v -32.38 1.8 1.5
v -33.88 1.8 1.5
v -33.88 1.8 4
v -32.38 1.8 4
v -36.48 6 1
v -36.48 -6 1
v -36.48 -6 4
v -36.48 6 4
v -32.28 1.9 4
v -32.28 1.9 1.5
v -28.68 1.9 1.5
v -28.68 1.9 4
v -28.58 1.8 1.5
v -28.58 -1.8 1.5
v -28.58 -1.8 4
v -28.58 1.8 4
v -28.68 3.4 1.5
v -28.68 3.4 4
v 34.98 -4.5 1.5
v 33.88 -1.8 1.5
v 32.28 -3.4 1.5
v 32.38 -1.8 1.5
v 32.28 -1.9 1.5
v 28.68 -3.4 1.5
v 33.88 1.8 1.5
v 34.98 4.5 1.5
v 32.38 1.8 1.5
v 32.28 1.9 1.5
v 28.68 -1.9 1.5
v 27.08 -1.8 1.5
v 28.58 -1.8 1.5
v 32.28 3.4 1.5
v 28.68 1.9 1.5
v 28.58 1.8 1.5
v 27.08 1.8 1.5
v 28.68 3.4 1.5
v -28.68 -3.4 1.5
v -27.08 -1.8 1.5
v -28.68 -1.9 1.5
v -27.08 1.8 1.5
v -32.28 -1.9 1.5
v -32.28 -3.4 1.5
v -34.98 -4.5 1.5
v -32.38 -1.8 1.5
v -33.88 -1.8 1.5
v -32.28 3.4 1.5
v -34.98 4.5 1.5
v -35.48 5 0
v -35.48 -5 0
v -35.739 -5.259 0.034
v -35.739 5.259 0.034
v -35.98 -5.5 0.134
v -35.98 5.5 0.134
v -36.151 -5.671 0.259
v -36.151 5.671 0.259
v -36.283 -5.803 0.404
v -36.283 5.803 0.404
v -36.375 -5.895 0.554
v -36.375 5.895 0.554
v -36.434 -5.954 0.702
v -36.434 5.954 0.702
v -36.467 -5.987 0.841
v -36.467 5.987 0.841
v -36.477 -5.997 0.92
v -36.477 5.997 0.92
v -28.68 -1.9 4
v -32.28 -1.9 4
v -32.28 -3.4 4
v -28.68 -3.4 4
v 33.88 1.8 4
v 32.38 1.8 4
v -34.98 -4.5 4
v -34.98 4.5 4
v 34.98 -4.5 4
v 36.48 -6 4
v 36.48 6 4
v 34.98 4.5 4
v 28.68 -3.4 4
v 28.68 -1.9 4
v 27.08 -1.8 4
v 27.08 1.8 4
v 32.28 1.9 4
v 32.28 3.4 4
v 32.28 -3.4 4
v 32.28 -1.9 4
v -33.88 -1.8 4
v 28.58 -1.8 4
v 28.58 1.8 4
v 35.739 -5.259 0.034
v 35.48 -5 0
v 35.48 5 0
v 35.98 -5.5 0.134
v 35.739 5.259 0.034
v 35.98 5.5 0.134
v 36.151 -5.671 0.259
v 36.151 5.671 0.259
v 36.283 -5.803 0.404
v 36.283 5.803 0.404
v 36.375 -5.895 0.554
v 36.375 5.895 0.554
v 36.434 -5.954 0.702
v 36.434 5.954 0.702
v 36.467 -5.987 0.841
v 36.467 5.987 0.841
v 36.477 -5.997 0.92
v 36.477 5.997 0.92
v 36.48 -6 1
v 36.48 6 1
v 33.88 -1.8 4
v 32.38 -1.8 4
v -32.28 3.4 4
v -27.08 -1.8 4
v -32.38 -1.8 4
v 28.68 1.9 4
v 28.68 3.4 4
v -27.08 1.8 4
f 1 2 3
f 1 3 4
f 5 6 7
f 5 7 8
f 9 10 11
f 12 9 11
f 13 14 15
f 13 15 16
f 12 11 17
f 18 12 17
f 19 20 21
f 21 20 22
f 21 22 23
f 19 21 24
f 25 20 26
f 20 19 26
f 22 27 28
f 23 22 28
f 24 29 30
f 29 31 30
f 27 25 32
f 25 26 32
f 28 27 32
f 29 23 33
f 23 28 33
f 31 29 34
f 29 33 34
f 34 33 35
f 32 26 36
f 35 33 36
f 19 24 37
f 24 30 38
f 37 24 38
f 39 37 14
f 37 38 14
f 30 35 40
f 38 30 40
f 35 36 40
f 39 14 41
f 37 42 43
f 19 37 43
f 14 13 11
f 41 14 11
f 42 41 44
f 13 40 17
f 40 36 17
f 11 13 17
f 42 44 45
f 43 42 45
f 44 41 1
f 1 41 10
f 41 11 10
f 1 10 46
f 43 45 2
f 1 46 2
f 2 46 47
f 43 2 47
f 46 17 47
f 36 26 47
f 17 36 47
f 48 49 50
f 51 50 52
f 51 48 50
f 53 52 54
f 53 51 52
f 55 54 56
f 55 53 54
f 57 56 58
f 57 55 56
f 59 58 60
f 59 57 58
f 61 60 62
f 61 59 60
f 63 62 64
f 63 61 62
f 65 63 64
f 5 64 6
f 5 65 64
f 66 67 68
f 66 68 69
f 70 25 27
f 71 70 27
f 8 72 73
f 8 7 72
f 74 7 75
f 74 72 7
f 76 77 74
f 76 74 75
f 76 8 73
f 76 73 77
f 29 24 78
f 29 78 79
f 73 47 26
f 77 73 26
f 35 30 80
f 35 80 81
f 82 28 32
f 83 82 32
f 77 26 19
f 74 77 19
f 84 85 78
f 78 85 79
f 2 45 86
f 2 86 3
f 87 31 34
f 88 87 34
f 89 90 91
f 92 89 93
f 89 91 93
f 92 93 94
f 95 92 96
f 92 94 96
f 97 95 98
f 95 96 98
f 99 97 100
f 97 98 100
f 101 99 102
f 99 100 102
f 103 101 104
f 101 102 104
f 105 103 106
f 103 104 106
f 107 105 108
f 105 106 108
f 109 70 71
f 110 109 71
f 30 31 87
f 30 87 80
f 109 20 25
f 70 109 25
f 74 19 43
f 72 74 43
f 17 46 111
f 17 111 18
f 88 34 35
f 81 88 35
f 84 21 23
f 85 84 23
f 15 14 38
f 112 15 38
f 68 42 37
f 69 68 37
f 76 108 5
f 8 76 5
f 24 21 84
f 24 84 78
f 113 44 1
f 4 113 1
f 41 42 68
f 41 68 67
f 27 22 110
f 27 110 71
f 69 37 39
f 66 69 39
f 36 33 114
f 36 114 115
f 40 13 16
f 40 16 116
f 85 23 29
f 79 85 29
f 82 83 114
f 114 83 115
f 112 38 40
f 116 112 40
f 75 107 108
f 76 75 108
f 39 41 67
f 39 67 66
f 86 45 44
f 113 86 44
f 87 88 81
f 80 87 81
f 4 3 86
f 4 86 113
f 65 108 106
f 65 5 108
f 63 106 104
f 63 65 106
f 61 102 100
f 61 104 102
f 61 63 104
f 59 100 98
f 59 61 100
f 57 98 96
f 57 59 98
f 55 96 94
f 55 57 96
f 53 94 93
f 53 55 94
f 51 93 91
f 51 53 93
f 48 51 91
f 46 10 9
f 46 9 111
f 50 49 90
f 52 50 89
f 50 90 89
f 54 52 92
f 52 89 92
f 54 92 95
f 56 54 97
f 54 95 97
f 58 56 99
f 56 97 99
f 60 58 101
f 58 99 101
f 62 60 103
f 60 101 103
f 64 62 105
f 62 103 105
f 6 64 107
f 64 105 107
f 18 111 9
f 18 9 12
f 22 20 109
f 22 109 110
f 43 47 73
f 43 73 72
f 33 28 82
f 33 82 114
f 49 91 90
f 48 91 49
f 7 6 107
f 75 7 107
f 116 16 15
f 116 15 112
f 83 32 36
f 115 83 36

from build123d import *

# Parameters (mm, degrees)
SKETCH_W      = 36.48
SKETCH_H      = 12
PAD_DEPTH     = 1.5
PAD001_DEPTH  = 2.5
SKETCH002_W   = 3.6
SKETCH002_H   = 1.5
SKETCH002_W_2 = 1.5
SKETCH002_H_2 = 3.6
PAD002_DEPTH  = 4
FILLET_R      = 1


with BuildPart() as part:
    # Sketch → Pad (new body)
    with BuildSketch(Plane.XY):
        with Locations((-18.24, 0)):
            Rectangle(SKETCH_W, SKETCH_H)
    pad = extrude(amount=PAD_DEPTH)

    # Sketch001 → Pad001 (join)
    with BuildSketch(Plane.XY.offset(1.5)):
        Polygon((-36.48, 6), (0, 6), (0, 4.5), (-34.98, 4.5), (-34.98, -4.5), (0, -4.5), (0, -6), (-36.48, -6), align=None)
    pad001 = extrude(amount=PAD001_DEPTH)

    # Sketch002 → Pad002 (join)
    with BuildSketch(Plane.XY):
        with Locations((-30.48, 2.65)):
            Rectangle(SKETCH002_W, SKETCH002_H)
        with Locations((-30.48, -2.65)):
            Rectangle(SKETCH002_W, SKETCH002_H)
        with Locations((-33.13, 0)):
            Rectangle(SKETCH002_W_2, SKETCH002_H_2)
        with Locations((-27.83, 0)):
            Rectangle(SKETCH002_W_2, SKETCH002_H_2)
    pad002 = extrude(amount=PAD002_DEPTH)

    # Mirrored: Pad across Sketch V_Axis
    add(pad.mirror(Plane(origin=(0, 0, 0), x_dir=(0, 0, 1), z_dir=(1, 0, 0))))

    # Mirrored001: Pad002 across Sketch002 V_Axis
    add(pad002.mirror(Plane(origin=(0, 0, 0), x_dir=(0, 0, 1), z_dir=(1, 0, 0))))

    # Mirrored002: Pad001 across Sketch001 V_Axis
    add(pad001.mirror(Plane(origin=(0, 0, 1.5), x_dir=(0, 0, 1), z_dir=(1, 0, 0))))

    # Fillet
    fillet_edges = [part.edges().sort_by_distance(p)[0] for p in [
        (36.48, 0, 0),
        (0, -6, 0),
        (-36.48, 0, 0),
        (0, 6, 0),
    ]]
    fillet(fillet_edges, radius=FILLET_R)


solid = part.part
